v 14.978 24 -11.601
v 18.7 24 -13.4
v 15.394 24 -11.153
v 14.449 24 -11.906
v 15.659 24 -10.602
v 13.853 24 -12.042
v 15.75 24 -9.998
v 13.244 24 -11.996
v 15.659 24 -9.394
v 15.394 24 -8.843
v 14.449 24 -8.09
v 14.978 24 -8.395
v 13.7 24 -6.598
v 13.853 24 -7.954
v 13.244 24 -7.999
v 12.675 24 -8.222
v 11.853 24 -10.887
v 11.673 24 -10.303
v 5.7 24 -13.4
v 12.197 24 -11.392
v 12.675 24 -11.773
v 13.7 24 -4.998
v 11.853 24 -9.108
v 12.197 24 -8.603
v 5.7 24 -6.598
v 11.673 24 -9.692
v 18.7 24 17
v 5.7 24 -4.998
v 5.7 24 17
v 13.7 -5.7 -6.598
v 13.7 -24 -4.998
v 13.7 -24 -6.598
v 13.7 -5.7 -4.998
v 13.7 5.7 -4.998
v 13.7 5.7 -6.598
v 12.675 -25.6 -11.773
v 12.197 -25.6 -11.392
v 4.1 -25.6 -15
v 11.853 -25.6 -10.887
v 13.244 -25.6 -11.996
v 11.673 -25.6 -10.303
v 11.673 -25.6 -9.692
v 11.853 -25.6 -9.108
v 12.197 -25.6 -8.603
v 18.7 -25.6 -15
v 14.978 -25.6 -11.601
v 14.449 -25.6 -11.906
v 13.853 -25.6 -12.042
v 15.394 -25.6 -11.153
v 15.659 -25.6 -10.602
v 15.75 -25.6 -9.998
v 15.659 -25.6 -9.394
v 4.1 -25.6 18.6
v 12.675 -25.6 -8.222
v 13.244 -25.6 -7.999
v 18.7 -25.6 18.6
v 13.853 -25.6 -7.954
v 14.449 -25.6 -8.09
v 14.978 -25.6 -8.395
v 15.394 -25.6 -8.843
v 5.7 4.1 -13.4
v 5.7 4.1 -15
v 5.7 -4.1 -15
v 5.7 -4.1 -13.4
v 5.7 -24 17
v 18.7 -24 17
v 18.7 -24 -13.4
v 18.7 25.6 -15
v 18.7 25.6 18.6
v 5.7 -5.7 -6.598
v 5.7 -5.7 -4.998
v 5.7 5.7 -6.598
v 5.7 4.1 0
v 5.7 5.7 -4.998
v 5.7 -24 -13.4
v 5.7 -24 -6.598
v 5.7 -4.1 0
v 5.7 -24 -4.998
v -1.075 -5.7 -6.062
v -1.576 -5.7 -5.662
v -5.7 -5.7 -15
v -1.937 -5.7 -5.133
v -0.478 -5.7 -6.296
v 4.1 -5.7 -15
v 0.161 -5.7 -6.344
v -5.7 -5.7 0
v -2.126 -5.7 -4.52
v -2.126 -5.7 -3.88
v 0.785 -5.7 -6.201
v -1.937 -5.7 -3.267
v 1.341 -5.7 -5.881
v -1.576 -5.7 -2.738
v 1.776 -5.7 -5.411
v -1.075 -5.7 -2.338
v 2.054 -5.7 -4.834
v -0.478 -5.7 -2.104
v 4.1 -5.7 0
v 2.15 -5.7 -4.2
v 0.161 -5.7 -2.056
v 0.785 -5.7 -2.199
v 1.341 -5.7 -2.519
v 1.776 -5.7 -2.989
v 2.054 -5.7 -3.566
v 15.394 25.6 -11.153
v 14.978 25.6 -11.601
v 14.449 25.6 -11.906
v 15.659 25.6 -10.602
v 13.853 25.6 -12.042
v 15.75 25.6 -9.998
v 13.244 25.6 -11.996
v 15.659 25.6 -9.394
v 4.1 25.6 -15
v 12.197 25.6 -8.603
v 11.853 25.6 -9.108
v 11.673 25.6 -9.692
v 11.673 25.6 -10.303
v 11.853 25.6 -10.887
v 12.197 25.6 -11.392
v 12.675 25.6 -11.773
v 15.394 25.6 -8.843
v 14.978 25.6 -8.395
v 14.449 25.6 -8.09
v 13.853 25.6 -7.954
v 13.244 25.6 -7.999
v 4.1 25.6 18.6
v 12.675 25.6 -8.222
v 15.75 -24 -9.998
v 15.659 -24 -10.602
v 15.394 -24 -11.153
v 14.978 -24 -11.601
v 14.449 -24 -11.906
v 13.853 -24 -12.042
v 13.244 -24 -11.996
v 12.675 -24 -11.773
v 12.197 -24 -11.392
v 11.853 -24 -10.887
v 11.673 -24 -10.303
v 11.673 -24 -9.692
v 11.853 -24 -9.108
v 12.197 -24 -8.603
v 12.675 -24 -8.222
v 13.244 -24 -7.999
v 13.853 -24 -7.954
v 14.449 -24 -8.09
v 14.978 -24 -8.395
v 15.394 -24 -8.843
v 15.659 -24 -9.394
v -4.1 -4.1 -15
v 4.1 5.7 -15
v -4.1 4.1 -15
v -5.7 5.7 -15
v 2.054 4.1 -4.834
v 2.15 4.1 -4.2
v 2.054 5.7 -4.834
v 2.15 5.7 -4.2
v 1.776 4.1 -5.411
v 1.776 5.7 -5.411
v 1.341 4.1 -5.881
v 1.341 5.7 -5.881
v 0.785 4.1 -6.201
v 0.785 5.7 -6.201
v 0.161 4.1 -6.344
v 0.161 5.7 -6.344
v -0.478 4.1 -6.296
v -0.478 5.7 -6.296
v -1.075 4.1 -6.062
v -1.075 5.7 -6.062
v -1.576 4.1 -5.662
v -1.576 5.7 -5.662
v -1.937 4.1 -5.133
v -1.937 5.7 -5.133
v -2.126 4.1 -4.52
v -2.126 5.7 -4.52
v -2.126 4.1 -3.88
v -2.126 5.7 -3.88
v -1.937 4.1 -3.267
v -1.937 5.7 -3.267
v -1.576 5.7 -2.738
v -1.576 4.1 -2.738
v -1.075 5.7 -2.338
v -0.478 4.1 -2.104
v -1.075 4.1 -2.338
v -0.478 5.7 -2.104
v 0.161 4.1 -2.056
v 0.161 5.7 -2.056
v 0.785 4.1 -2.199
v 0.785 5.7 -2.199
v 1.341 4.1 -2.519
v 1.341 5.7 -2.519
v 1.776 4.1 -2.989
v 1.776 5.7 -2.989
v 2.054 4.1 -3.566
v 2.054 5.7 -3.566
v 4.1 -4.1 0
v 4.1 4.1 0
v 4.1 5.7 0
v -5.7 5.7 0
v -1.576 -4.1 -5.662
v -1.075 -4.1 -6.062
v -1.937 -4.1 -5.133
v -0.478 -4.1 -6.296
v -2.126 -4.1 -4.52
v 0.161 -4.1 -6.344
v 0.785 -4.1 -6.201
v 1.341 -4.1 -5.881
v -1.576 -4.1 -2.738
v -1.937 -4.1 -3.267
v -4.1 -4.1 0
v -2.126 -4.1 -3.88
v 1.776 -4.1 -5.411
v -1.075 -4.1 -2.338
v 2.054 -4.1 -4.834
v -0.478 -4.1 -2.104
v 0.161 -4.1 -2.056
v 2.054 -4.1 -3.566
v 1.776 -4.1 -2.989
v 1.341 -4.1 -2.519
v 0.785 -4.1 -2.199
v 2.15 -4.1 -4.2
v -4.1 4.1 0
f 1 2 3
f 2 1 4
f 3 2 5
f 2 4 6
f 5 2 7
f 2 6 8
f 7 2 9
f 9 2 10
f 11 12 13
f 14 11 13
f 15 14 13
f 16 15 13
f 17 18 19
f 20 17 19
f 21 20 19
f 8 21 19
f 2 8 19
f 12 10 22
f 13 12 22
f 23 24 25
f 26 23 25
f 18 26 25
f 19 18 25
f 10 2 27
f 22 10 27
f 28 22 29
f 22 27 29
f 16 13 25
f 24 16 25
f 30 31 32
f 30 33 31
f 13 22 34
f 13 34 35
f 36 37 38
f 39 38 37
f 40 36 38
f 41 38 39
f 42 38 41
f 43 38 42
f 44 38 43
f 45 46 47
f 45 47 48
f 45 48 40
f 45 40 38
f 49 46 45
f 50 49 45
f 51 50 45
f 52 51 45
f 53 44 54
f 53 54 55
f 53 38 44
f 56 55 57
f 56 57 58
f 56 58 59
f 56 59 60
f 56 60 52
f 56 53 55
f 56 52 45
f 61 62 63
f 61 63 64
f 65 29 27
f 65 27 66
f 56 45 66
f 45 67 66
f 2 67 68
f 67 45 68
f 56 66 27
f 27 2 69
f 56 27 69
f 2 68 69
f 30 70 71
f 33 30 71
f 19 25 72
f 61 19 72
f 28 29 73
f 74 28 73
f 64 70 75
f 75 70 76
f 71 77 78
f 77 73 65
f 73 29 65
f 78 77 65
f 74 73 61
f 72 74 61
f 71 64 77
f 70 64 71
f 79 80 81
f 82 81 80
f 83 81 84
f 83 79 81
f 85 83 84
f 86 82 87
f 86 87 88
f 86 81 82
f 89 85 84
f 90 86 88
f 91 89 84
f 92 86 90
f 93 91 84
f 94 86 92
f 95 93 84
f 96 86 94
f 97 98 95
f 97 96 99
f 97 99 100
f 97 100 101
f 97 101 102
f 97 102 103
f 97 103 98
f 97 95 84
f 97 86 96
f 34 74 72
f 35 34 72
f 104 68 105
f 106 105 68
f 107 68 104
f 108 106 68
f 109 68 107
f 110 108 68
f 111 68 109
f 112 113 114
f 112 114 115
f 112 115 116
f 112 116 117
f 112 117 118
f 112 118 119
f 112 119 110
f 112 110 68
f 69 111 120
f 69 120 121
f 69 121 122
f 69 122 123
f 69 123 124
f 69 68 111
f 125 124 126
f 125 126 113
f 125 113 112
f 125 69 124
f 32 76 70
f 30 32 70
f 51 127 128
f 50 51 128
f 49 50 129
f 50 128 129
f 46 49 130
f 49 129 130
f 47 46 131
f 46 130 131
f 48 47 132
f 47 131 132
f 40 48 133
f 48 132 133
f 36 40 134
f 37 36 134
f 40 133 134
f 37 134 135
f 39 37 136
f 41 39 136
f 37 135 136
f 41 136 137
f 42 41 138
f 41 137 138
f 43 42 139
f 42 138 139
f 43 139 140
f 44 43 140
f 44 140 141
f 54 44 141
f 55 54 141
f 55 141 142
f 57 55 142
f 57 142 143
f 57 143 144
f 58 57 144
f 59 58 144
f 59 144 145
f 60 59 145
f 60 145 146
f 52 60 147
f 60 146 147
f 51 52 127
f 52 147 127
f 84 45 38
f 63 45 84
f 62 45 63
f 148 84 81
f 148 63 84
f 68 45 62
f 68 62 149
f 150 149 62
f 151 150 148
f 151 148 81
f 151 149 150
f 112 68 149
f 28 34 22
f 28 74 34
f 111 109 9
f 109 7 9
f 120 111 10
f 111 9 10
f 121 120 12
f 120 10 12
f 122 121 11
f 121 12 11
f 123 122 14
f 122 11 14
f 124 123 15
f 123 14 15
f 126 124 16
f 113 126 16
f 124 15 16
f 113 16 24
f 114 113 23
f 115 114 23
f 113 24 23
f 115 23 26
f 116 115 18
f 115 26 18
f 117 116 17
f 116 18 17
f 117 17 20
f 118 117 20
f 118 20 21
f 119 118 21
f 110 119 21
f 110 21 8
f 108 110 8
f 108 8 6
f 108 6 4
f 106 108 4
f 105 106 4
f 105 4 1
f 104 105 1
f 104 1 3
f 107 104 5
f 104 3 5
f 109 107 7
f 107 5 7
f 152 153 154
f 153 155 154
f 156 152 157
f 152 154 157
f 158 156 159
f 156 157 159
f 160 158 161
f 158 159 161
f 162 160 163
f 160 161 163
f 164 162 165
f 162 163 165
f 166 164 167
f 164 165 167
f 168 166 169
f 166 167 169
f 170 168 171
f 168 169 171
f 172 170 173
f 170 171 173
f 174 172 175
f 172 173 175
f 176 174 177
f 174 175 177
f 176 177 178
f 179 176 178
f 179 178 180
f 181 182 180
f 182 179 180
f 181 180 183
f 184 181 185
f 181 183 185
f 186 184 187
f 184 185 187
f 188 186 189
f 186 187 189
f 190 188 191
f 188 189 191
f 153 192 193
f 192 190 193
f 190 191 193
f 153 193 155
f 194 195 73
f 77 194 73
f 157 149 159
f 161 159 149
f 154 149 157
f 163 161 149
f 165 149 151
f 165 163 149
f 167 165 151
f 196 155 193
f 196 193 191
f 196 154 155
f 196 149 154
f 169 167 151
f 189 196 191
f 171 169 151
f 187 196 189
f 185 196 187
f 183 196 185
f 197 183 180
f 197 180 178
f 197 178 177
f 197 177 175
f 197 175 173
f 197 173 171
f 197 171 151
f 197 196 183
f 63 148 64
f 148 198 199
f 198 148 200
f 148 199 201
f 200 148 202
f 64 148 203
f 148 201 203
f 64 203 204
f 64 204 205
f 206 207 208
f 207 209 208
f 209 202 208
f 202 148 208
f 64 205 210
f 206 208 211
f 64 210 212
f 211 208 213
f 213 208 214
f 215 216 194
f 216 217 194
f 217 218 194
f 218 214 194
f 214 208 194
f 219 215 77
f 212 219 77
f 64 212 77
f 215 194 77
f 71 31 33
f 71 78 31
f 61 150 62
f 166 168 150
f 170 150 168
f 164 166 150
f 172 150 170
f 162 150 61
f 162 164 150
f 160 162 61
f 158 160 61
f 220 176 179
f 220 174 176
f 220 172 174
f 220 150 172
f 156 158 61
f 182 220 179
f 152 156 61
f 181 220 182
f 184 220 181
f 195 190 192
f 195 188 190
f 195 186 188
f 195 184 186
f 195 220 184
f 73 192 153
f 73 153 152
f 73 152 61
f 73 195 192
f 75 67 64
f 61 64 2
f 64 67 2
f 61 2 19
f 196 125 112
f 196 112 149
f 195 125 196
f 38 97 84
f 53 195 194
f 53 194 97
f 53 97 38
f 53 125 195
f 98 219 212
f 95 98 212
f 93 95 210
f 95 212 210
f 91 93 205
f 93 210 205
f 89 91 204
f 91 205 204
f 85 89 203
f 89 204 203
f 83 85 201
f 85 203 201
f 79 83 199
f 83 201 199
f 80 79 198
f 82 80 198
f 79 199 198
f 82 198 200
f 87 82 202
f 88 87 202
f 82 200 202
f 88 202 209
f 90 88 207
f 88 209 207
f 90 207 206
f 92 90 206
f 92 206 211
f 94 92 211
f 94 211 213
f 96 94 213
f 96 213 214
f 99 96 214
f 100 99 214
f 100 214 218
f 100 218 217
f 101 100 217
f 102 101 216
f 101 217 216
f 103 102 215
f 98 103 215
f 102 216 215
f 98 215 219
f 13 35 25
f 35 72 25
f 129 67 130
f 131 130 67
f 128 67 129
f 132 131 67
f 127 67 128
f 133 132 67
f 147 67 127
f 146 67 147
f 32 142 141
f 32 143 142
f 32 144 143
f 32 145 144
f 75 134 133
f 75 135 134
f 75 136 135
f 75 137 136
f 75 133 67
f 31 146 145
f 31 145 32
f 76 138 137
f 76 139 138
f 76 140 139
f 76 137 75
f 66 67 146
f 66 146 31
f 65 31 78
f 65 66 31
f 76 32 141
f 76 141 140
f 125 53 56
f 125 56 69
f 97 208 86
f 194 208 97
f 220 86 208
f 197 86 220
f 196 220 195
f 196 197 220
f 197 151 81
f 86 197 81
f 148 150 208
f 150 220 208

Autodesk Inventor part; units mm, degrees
ref_plane "YZ Plane" through (0, 0, 0) normal (1, 0, 0) x (0, 1, 0)
ref_plane "XZ Plane" through (0, 0, 0) normal (0, 1, 0) x (-1, 0, 0)
ref_plane "XY Plane" through (0, 0, 0) normal (0, 0, 1) x (1, 0, 0)
sketch "Sketch1" plane through (0, 0, 0) normal (0, 0, 1) x (1, 0, 0)
  line L0 (-5.7, 0) -> (-5.7, -5.7)
  line L1 (-5.7, -5.7) -> (0, -5.7)
  line L2 (0, 5.7) -> (-5.7, 5.7)
  line L3 (-5.7, 5.7) -> (-5.7, 0)
  line L4 (0, 4.1) -> (-4.1, 4.1)
  line L5 (-4.1, 4.1) -> (-4.1, -4.1)
  line L6 (-4.1, -4.1) -> (0, -4.1)
  line L7 (3.9, -5.7) -> (0, -5.7)
  line L8 (3.9, 5.7) -> (0, 5.7)
  line L9 (3.9, 5.7) -> (5.5, 5.7)
  line L10 (3.9, -5.7) -> (5.5, -5.7)
  line L11 (5.5, 4.1) -> (0, 4.1)
  line L12 (5.5, -4.1) -> (0, -4.1)
  line L13 (0, 0) -> (4.1, 0)
  line L14 (4.1, 0) -> (5.7, 0)
  line L15 (5.7, 0) -> (5.7, 5.7)
  line L16 (5.7, 5.7) -> (5.5, 5.7)
  line L17 (5.5, 4.1) -> (5.7, 4.1)
  line L18 (5.7, 0) -> (5.7, -5.7)
  line L19 (5.7, -5.7) -> (5.5, -5.7)
  line L20 (5.5, -4.1) -> (5.7, -4.1)
  dimension "d22" = 4.1
  dimension "d23" = 1.6
extrude "Extrusion1" add sketch "Sketch1" against normal blind 15 contours L3 L2 L8 L9 L16 L15 L17 L11 L4 L5 L6 L12 L20 L18 L19 L10 L7 L1 L0
sketch "Sketch2" plane through (-5.7, 5.7, 0) normal (0, 1, 0) x (1, 0, 0)
  line L0 (5.7, 0) -> (5.7, 4.2)
  circle A0 centre (5.7, 4.2) radius 2.15
  dimension "d10" = 4.2
  dimension "d11" = 4.3
extrude "Extrusion2" cut sketch "Sketch2" against normal blind 15
sketch "Sketch3" plane through (0, 0, 0) normal (0, 0, 1) x (1, 0, 0)
  point P0 (0, 0)
sketch "Sketch4" plane through (0, 0, 0) normal (0, 0, 1) x (1, 0, 0)
  point P0 (5.5, 5.7)
sketch "Sketch5" plane through (0, 0, 0) normal (0, 0, 1) x (1, 0, 0)
  line L0 (5.7, 4.1) -> (5.7, 0)
  line L1 (5.7, 0) -> (5.7, 24)
  line L2 (5.7, 0) -> (5.7, -24)
  line L3 (5.7, -25.6) -> (4.1, -25.6)
  line L4 (5.7, -5.7) -> (-5.7, -5.7) projected
  line L5 (4.1, -5.7) -> (4.1, -25.6)
  line L6 (5.7, 25.6) -> (4.1, 25.6)
  line L7 (4.1, 25.6) -> (4.1, 5.7)
  line L8 (5.7, 5.7) -> (-5.7, 5.7) projected
  line L9 (5.7, 25.6) -> (18.7, 25.6)
  line L10 (18.7, 25.6) -> (18.7, 24)
  line L11 (18.7, 24) -> (5.7, 24)
  line L12 (5.7, -25.6) -> (18.7, -25.6)
  line L13 (18.7, -25.6) -> (18.7, -24)
  line L14 (18.7, -24) -> (5.7, -24)
  line L15 (4.1, 5.7) -> (4.1, -5.7)
  line L16 (5.7, -4.1) -> (-4.1, -4.1) projected
  line L17 (4.1, 5.7) -> (5.7, 5.7)
  line L18 (4.1, 4.1) -> (5.7, 4.1)
  line L19 (4.1, -4.1) -> (5.7, -4.1)
  line L20 (4.1, -5.7) -> (5.7, -5.7)
  point P0 (0, 0)
extrude "Extrusion3" add sketch "Sketch5" against normal blind 15 contours L8 L7 L6 L9 L10 L11 L1 | L2 L14 L13 L12 L3 L5 L4
sketch "Sketch6" plane through (0, 0, 0) normal (0, 0, 1) x (1, 0, 0)
  line L0 (18.7, -25.6) -> (4.1, -25.6) projected
  line L1 (4.1, -25.6) -> (4.1, 4.1)
  line L2 (5.7, 4.1) -> (-4.1, 4.1) projected
  line L3 (5.7, -4.1) -> (5.7, -24) projected
  line L4 (5.7, 4.1) -> (5.7, -24)
  line L5 (4.1, -25.6) -> (18.7, -25.6)
  line L6 (18.7, -24) -> (18.7, -25.6) projected
  line L7 (18.7, -24) -> (5.7, -24) projected
  line L8 (18.7, -24) -> (5.7, -24)
  line L9 (5.7, 4.1) -> (5.7, 24) projected
  line L10 (5.7, 4.1) -> (5.7, 24)
  line L11 (5.7, 24) -> (18.7, 24)
  line L12 (18.7, 25.6) -> (4.1, 25.6) projected
  line L13 (18.7, 24) -> (18.7, 25.6) projected
  line L14 (18.7, 25.6) -> (18.7, 24)
  line L15 (18.7, 25.6) -> (4.1, 25.6)
  line L16 (4.1, 4.1) -> (4.1, 25.6)
  line L17 (4.1, 5.7) -> (-5.7, 5.7) projected
  point P0 (0, 0)
extrude "Extrusion4" add sketch "Sketch6" along normal blind 18.6
sketch "Sketch7" plane through (5.7, 4.1, -15) normal (1, 0, 0) x (0, 0, -1)
  line L0 (0, -28.1) -> (-33.6, -28.1) projected
  line L1 (-33.6, -28.1) -> (-33.6, 19.9) projected
  line L2 (-33.6, -28.1) -> (-33.6, 19.9)
  line L3 (-33.6, 19.9) -> (-32, 19.9)
  line L4 (0, 19.9) -> (-33.6, 19.9) projected
  line L5 (-32, 19.9) -> (-32, -28.1)
  line L6 (-32, -28.1) -> (-33.6, -28.1)
  point P0 (-15, -4.1)
  dimension "d35" = 1.6
extrude "Extrusion5" add sketch "Sketch7" along normal blind 13
sketch "Sketch8" plane through (5.7, -24, -15) normal (1, 0, 0) x (0, 0, -1)
  line L0 (0, 0) -> (0, -1.6) projected
  line L1 (-8.4022, 0) -> (-11.0502, 0)
  line L2 (-32, 0) -> (0, 0) projected
  line L3 (-11.0502, 0) -> (-10.0022, 0)
  line L4 (-10.0022, 0) -> (-10.0022, 18.3)
  line L5 (0, 18.3) -> (-15, 18.3) projected
  line L6 (0, 49.6) -> (-33.6, 49.6) projected
  line L7 (-8.4022, 49.6) -> (-10.0022, 49.6)
  line L8 (-15, 29.7) -> (0, 29.7) projected
  line L9 (-10.0022, 29.7) -> (-10.0022, 49.6)
  line L10 (-10.0022, 0) -> (-10.0022, 18.3)
  line L11 (-10.0022, 29.7) -> (-10.0022, 48)
  line L12 (-32, 48) -> (0, 48) projected
  line L13 (-10.0022, 0) -> (-8.4022, 0)
  line L14 (-8.4022, 0) -> (-8.4022, 18.3)
  line L15 (-8.4022, 29.7) -> (-8.4022, 48)
  line L16 (-10.0022, 18.3) -> (-8.4022, 18.3)
  line L17 (-10.0022, 29.7) -> (-8.4022, 29.7)
  line L18 (-10.0022, 48) -> (-8.4022, 48)
  line L19 (-10.0022, 0) -> (-8.4022, 0)
  point P0 (-15, 24)
  dimension "d38" = 1.6
extrude "Extrusion6" add sketch "Sketch8" along normal blind 8
sketch "Sketch9" plane through (5.7, 24, -15) normal (0, -1, 0) x (1, 0, 0)
  line L0 (13, 0) -> (0, 0) projected
  line L1 (13, 0) -> (13, 1.6)
  line L2 (13, 32) -> (13, 0) projected
  line L3 (13, 1.6) -> (0, 1.6)
  line L4 (0, 0) -> (0, 8.4022) projected
  line L5 (0, 0) -> (0, 1.6)
  line L6 (-1.6, 0) -> (13, 0) projected
  line L7 (0, 0) -> (13, 0)
  point P0 (-5.7, 15)
  dimension "d41" = 1.6
extrude "Extrusion7" add sketch "Sketch9" along normal blind 48
sketch "Sketch10" plane through (18.7, -25.6, -15) normal (1, 0, 0) x (0, 0, -1)
  point P0 (-15, 25.6)
sketch "Sketch11" plane through (5.7, 24, 17) normal (0, -1, 0) x (1, 0, 0)
  line L0 (8, -23.5978) -> (8, -26.9978)
  line L1 (0, -30.4) -> (13, -30.4) projected
  circle A0 centre (8, -26.9978) radius 2.05
  point P0 (-5.7, -17)
  dimension "d44" = 3.4
  dimension "d45" = 4.1
extrude "Extrusion8" cut sketch "Sketch11" along normal blind 59
extrude "Extrusion9" cut sketch "Sketch11" against normal blind 18
